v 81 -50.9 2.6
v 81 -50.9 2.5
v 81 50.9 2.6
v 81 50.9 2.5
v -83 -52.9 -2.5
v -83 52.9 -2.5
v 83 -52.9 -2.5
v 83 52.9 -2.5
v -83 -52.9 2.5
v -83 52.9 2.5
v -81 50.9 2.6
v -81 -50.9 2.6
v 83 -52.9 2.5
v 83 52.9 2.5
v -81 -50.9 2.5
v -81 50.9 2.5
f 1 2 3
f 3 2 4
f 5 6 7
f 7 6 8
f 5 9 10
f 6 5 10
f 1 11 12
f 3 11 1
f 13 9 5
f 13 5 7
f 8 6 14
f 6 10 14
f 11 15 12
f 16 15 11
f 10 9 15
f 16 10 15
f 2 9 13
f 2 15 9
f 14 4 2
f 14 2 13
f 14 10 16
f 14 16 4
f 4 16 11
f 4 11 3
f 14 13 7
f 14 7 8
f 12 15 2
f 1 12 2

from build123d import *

# Parameters (mm, degrees)
CROQUIS1_W              = 166
CROQUIS1_H              = 105.8
SALIENTE_EXTRUIR1_DEPTH = 2.5
CROQUIS3_W              = 162
CROQUIS3_H              = 101.8
SALIENTE_EXTRUIR2_DEPTH = 0.1


with BuildPart() as part:
    # Croquis1 → Saliente-Extruir1 (new, symmetric)
    with BuildSketch(Plane.XY):
        Rectangle(CROQUIS1_W, CROQUIS1_H)
    extrude(amount=SALIENTE_EXTRUIR1_DEPTH, both=True)

    # Croquis3 → Saliente-Extruir2 (add)
    with BuildSketch(Plane.XY.offset(2.5)):
        Rectangle(CROQUIS3_W, CROQUIS3_H)
    extrude(amount=SALIENTE_EXTRUIR2_DEPTH)


solid = part.part
